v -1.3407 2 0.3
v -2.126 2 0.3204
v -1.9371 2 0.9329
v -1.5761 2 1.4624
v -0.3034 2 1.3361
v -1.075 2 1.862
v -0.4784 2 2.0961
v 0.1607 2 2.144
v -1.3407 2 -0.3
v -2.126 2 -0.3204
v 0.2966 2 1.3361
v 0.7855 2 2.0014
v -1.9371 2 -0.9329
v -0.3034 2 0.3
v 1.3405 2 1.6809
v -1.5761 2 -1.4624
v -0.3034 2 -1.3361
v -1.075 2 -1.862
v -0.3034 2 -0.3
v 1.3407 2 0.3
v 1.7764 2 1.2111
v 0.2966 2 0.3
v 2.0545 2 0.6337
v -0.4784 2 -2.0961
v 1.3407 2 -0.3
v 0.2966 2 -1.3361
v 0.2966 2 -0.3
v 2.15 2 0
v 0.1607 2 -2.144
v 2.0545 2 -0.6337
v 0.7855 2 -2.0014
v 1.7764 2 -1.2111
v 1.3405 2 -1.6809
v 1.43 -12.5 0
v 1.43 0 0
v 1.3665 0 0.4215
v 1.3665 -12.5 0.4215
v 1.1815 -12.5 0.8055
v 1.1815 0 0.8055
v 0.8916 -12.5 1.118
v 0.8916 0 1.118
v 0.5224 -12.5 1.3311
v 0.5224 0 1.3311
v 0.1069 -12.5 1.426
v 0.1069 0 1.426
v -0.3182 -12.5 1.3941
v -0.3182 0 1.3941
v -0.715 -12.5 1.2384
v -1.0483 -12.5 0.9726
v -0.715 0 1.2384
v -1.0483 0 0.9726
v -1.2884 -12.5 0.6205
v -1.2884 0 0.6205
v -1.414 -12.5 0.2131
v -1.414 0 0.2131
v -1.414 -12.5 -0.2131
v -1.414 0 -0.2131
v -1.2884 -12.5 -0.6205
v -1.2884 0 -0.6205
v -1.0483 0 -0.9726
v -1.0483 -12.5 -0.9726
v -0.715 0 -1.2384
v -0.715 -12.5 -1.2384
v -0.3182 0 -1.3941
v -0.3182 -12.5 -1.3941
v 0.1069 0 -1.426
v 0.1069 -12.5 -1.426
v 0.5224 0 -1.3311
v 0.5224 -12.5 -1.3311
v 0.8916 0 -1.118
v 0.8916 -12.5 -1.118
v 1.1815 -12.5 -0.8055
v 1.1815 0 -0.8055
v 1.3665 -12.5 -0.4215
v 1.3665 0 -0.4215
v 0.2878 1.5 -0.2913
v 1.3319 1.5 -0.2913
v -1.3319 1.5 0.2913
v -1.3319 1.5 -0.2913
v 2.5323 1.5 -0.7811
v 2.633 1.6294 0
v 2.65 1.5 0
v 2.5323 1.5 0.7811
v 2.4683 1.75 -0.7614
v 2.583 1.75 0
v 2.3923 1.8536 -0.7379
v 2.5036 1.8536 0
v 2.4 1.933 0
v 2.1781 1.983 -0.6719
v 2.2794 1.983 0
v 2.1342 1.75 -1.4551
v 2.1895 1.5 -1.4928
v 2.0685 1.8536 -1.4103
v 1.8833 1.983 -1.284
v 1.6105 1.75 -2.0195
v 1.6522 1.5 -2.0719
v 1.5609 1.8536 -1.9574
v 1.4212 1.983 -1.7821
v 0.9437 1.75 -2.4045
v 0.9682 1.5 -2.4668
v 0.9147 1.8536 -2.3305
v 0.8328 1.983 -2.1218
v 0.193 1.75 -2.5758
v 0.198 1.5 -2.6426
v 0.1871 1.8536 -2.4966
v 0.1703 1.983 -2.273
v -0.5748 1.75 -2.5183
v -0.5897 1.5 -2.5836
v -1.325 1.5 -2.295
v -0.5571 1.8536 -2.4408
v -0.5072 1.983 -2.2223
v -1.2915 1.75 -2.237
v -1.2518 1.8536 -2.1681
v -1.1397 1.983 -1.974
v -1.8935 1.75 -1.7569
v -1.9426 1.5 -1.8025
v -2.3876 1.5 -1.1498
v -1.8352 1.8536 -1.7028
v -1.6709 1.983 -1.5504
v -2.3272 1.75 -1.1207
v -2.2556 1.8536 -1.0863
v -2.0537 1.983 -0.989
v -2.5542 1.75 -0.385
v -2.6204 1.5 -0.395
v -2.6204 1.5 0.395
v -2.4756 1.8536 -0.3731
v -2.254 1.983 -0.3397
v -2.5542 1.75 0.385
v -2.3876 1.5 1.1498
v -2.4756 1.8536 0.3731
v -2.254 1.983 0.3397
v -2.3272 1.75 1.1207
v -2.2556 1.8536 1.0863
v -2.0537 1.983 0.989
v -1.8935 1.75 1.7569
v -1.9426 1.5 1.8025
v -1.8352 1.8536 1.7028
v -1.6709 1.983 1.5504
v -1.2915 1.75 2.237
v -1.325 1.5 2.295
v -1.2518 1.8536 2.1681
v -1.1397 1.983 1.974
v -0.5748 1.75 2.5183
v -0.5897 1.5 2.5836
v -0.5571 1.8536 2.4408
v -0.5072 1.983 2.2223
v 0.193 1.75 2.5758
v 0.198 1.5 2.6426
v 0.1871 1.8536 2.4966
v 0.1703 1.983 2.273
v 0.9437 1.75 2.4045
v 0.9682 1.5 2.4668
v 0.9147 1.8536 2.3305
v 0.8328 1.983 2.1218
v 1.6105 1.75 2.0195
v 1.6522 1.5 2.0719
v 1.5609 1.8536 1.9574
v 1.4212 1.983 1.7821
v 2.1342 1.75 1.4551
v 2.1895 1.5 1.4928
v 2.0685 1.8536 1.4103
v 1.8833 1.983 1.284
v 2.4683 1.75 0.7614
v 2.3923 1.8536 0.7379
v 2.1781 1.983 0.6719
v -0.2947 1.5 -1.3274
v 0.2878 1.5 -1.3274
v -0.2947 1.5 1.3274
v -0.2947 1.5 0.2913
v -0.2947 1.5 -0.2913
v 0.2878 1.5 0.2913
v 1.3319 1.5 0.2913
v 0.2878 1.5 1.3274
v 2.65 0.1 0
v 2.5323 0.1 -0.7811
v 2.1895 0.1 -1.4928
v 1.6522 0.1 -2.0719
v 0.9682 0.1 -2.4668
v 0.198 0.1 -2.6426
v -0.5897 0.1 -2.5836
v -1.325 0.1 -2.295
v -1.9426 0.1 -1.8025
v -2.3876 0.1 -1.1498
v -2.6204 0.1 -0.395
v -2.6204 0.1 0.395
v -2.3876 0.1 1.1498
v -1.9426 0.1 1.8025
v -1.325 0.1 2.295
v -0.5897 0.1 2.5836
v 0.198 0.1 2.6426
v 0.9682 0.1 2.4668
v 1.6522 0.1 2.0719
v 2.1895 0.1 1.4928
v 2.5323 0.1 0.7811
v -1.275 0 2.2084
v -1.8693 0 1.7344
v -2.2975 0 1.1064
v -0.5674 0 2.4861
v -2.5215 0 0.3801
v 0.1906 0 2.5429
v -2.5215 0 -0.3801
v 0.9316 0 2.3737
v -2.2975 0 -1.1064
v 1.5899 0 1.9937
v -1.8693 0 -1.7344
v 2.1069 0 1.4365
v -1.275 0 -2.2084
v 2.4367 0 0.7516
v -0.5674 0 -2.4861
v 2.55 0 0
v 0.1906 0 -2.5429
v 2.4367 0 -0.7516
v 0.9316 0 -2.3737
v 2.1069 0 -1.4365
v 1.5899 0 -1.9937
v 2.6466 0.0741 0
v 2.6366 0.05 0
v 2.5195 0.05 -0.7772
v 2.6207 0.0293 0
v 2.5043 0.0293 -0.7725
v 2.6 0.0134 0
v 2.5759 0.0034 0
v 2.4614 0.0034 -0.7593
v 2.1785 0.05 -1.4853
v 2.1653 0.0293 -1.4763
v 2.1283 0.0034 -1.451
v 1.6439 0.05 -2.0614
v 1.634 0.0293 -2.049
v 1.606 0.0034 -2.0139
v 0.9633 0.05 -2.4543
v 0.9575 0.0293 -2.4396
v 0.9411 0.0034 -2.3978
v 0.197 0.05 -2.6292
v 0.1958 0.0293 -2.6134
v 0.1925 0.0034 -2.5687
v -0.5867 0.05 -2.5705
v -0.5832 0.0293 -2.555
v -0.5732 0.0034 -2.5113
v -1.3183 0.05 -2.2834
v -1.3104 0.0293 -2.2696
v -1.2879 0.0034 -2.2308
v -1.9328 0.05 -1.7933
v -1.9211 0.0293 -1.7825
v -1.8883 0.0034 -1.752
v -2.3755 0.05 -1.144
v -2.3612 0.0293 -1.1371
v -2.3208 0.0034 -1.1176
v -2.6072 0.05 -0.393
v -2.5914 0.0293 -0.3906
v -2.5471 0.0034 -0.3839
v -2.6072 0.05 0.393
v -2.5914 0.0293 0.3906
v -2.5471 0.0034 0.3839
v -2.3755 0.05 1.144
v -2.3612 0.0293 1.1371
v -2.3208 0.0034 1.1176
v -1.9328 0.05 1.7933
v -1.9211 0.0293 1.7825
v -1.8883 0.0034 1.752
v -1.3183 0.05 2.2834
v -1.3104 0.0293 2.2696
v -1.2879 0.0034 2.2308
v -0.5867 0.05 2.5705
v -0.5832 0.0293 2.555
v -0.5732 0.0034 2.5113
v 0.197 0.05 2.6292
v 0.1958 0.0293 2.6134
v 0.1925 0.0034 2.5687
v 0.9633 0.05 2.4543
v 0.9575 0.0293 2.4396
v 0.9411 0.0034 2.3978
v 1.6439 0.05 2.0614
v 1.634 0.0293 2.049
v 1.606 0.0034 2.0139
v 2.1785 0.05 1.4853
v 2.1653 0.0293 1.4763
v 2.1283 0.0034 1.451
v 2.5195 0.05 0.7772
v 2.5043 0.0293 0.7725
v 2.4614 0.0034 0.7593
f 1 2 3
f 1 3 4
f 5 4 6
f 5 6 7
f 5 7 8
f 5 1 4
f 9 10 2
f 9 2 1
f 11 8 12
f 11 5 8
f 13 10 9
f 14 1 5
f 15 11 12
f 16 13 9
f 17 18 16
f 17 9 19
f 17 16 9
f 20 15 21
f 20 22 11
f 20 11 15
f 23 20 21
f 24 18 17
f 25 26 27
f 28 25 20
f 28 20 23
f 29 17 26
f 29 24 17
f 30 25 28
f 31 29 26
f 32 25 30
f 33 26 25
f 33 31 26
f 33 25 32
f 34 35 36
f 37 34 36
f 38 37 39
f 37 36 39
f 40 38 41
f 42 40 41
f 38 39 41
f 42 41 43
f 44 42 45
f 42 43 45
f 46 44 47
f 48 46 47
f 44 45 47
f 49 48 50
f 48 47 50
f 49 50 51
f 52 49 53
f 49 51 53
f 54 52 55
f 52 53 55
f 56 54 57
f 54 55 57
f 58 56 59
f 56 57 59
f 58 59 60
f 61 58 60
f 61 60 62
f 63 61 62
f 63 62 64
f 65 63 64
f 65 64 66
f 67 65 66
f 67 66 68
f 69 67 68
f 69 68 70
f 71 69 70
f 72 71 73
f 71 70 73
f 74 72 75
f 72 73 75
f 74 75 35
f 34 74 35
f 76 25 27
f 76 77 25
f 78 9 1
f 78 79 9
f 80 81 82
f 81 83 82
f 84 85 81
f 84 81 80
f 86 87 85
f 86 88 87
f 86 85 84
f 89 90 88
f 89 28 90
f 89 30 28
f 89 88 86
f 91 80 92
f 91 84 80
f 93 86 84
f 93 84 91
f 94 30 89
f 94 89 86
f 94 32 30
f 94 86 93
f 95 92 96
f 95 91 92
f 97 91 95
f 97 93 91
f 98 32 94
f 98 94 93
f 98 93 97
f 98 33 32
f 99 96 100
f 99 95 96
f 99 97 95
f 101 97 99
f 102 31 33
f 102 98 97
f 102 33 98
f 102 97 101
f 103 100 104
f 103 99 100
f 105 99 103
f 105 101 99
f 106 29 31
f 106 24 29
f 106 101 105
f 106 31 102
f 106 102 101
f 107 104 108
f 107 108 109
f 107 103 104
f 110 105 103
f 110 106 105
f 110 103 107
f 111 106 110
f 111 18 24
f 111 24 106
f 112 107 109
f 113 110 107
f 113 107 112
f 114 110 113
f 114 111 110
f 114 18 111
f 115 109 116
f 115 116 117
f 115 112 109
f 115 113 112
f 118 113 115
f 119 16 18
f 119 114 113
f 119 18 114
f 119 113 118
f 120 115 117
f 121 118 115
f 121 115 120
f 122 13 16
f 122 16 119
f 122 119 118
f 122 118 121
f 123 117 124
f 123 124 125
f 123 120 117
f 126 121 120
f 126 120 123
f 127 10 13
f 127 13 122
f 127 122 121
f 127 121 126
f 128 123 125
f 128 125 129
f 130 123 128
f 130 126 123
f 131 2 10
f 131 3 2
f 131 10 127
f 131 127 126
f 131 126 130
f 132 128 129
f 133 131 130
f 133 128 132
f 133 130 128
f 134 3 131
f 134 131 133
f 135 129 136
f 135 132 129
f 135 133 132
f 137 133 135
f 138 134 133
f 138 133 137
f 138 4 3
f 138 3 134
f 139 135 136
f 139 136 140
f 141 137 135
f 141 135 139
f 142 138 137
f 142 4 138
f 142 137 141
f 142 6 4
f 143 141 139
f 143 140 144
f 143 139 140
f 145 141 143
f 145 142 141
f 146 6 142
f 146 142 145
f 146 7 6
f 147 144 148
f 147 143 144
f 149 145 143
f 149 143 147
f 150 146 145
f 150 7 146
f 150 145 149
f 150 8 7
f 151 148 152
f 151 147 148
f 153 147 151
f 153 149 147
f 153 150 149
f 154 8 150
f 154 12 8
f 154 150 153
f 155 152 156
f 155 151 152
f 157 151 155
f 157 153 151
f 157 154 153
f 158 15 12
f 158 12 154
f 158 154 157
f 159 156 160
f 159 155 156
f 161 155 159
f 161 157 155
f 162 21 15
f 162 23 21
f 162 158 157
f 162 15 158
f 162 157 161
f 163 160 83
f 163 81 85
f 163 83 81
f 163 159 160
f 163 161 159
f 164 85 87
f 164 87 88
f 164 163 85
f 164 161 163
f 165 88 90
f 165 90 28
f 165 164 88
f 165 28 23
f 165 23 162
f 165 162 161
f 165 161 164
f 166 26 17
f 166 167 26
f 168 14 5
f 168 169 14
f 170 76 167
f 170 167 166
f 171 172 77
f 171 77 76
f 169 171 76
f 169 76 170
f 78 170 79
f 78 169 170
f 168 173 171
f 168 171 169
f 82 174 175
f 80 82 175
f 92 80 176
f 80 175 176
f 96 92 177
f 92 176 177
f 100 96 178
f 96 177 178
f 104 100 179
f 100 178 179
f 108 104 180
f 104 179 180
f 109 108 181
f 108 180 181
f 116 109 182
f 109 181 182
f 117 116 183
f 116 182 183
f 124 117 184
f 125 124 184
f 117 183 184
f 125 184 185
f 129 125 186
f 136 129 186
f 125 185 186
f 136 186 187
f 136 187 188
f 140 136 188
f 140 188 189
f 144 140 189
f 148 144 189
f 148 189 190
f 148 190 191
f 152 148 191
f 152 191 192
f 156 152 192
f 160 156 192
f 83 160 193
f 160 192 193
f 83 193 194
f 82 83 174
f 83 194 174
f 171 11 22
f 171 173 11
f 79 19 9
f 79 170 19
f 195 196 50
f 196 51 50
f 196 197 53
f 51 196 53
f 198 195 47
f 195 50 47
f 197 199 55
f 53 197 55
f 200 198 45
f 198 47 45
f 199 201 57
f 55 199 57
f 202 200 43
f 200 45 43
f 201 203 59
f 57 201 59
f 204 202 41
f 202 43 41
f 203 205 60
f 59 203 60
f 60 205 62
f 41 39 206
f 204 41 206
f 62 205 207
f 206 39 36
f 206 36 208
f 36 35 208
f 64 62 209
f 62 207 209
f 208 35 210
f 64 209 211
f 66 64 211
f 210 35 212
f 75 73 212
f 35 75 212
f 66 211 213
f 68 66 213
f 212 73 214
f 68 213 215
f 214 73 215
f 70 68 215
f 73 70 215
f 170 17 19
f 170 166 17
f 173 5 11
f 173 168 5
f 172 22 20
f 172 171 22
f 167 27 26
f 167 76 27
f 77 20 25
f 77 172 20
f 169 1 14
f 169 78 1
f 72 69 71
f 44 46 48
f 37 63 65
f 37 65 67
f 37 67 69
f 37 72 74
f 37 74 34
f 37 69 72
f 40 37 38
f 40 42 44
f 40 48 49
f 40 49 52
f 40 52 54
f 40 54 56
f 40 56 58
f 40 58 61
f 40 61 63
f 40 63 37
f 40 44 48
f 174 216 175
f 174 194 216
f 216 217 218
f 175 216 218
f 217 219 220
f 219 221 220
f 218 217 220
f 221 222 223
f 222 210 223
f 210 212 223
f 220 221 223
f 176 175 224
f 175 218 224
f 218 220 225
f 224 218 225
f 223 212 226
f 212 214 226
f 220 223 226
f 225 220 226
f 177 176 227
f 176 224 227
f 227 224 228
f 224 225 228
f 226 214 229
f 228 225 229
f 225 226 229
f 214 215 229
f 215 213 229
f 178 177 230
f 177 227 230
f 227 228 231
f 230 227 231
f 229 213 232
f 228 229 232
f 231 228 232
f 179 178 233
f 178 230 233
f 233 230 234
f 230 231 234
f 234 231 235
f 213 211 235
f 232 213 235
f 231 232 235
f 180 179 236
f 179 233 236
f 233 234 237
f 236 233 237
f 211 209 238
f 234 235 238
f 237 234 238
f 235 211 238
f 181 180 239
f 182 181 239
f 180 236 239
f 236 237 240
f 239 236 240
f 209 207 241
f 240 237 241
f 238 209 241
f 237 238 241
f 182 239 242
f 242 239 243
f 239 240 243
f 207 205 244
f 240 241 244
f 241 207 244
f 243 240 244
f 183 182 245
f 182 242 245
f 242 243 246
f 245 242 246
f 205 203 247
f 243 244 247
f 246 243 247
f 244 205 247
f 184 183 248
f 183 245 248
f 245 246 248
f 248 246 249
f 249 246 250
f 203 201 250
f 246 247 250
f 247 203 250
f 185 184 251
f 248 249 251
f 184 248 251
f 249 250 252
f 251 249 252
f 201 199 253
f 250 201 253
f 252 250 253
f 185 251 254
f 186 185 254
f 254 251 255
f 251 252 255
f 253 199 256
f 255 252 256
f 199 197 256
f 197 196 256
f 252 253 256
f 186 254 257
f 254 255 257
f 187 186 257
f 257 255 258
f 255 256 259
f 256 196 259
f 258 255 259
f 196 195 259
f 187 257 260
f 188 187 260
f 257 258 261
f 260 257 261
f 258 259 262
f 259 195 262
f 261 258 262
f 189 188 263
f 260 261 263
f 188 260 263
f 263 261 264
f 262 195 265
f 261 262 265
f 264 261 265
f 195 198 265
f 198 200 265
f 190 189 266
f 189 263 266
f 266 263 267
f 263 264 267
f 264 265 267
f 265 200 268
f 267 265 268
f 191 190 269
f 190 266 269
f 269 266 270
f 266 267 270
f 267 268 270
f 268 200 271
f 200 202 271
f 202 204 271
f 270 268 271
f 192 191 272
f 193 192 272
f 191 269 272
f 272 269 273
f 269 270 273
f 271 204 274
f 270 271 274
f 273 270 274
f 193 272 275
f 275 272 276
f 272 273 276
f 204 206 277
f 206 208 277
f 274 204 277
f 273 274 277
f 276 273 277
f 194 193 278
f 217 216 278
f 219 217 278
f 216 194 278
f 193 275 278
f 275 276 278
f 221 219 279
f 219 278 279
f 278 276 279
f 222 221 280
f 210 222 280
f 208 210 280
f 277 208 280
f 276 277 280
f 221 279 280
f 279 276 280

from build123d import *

# Parameters (mm, degrees)
SKETCH1_R           = 2.65
BOSS_EXTRUDE1_DEPTH = 2
SKETCH2_R           = 1.43
BOSS_EXTRUDE2_DEPTH = 12.5
FILLET1_R           = 0.5
FILLET2_R           = 0.1
CUT_EXTRUDE1_DEPTH  = 0.5
CUT_EXTRUDE1_TAPER  = 1


with BuildPart() as part:
    # Sketch1 → Boss-Extrude1 (new body)
    with BuildSketch(Plane(origin=(0, 0, 0), x_dir=(1, 0, 0), z_dir=(0, 1, 0))):
        Circle(SKETCH1_R)
    extrude(amount=BOSS_EXTRUDE1_DEPTH)

    # Sketch2 → Boss-Extrude2 (add)
    with BuildSketch(Plane.XZ):
        Circle(SKETCH2_R)
    extrude(amount=BOSS_EXTRUDE2_DEPTH)

    # Fillet1
    fillet1_edges = [part.edges().sort_by_distance(p)[0] for p in [
        (-2.65, 2, 0),
    ]]
    fillet(fillet1_edges, radius=FILLET1_R)

    # Fillet2
    fillet2_edges = [part.edges().sort_by_distance(p)[0] for p in [
        (-2.65, 0, 0),
    ]]
    fillet(fillet2_edges, radius=FILLET2_R)

    # Sketch3 → Cut-Extrude1 (cut)
    with BuildSketch(Plane(origin=(0, 2, 0), x_dir=(1, 0, 0), z_dir=(0, 1, 0))):
        Polygon((0.296573117, 0.3), (0.296573117, 1.336133674), (-0.303426883, 1.336133674), (-0.303426883, 0.3), (-1.340662941, 0.3), (-1.340662941, -0.3), (-0.303426883, -0.3), (-0.303426883, -1.336133674), (0.296573117, -1.336133674), (0.296573117, -0.3), (1.340662941, -0.3), (1.340662941, 0.3), align=None)
    extrude(amount=-CUT_EXTRUDE1_DEPTH, taper=CUT_EXTRUDE1_TAPER, mode=Mode.SUBTRACT)


solid = part.part
